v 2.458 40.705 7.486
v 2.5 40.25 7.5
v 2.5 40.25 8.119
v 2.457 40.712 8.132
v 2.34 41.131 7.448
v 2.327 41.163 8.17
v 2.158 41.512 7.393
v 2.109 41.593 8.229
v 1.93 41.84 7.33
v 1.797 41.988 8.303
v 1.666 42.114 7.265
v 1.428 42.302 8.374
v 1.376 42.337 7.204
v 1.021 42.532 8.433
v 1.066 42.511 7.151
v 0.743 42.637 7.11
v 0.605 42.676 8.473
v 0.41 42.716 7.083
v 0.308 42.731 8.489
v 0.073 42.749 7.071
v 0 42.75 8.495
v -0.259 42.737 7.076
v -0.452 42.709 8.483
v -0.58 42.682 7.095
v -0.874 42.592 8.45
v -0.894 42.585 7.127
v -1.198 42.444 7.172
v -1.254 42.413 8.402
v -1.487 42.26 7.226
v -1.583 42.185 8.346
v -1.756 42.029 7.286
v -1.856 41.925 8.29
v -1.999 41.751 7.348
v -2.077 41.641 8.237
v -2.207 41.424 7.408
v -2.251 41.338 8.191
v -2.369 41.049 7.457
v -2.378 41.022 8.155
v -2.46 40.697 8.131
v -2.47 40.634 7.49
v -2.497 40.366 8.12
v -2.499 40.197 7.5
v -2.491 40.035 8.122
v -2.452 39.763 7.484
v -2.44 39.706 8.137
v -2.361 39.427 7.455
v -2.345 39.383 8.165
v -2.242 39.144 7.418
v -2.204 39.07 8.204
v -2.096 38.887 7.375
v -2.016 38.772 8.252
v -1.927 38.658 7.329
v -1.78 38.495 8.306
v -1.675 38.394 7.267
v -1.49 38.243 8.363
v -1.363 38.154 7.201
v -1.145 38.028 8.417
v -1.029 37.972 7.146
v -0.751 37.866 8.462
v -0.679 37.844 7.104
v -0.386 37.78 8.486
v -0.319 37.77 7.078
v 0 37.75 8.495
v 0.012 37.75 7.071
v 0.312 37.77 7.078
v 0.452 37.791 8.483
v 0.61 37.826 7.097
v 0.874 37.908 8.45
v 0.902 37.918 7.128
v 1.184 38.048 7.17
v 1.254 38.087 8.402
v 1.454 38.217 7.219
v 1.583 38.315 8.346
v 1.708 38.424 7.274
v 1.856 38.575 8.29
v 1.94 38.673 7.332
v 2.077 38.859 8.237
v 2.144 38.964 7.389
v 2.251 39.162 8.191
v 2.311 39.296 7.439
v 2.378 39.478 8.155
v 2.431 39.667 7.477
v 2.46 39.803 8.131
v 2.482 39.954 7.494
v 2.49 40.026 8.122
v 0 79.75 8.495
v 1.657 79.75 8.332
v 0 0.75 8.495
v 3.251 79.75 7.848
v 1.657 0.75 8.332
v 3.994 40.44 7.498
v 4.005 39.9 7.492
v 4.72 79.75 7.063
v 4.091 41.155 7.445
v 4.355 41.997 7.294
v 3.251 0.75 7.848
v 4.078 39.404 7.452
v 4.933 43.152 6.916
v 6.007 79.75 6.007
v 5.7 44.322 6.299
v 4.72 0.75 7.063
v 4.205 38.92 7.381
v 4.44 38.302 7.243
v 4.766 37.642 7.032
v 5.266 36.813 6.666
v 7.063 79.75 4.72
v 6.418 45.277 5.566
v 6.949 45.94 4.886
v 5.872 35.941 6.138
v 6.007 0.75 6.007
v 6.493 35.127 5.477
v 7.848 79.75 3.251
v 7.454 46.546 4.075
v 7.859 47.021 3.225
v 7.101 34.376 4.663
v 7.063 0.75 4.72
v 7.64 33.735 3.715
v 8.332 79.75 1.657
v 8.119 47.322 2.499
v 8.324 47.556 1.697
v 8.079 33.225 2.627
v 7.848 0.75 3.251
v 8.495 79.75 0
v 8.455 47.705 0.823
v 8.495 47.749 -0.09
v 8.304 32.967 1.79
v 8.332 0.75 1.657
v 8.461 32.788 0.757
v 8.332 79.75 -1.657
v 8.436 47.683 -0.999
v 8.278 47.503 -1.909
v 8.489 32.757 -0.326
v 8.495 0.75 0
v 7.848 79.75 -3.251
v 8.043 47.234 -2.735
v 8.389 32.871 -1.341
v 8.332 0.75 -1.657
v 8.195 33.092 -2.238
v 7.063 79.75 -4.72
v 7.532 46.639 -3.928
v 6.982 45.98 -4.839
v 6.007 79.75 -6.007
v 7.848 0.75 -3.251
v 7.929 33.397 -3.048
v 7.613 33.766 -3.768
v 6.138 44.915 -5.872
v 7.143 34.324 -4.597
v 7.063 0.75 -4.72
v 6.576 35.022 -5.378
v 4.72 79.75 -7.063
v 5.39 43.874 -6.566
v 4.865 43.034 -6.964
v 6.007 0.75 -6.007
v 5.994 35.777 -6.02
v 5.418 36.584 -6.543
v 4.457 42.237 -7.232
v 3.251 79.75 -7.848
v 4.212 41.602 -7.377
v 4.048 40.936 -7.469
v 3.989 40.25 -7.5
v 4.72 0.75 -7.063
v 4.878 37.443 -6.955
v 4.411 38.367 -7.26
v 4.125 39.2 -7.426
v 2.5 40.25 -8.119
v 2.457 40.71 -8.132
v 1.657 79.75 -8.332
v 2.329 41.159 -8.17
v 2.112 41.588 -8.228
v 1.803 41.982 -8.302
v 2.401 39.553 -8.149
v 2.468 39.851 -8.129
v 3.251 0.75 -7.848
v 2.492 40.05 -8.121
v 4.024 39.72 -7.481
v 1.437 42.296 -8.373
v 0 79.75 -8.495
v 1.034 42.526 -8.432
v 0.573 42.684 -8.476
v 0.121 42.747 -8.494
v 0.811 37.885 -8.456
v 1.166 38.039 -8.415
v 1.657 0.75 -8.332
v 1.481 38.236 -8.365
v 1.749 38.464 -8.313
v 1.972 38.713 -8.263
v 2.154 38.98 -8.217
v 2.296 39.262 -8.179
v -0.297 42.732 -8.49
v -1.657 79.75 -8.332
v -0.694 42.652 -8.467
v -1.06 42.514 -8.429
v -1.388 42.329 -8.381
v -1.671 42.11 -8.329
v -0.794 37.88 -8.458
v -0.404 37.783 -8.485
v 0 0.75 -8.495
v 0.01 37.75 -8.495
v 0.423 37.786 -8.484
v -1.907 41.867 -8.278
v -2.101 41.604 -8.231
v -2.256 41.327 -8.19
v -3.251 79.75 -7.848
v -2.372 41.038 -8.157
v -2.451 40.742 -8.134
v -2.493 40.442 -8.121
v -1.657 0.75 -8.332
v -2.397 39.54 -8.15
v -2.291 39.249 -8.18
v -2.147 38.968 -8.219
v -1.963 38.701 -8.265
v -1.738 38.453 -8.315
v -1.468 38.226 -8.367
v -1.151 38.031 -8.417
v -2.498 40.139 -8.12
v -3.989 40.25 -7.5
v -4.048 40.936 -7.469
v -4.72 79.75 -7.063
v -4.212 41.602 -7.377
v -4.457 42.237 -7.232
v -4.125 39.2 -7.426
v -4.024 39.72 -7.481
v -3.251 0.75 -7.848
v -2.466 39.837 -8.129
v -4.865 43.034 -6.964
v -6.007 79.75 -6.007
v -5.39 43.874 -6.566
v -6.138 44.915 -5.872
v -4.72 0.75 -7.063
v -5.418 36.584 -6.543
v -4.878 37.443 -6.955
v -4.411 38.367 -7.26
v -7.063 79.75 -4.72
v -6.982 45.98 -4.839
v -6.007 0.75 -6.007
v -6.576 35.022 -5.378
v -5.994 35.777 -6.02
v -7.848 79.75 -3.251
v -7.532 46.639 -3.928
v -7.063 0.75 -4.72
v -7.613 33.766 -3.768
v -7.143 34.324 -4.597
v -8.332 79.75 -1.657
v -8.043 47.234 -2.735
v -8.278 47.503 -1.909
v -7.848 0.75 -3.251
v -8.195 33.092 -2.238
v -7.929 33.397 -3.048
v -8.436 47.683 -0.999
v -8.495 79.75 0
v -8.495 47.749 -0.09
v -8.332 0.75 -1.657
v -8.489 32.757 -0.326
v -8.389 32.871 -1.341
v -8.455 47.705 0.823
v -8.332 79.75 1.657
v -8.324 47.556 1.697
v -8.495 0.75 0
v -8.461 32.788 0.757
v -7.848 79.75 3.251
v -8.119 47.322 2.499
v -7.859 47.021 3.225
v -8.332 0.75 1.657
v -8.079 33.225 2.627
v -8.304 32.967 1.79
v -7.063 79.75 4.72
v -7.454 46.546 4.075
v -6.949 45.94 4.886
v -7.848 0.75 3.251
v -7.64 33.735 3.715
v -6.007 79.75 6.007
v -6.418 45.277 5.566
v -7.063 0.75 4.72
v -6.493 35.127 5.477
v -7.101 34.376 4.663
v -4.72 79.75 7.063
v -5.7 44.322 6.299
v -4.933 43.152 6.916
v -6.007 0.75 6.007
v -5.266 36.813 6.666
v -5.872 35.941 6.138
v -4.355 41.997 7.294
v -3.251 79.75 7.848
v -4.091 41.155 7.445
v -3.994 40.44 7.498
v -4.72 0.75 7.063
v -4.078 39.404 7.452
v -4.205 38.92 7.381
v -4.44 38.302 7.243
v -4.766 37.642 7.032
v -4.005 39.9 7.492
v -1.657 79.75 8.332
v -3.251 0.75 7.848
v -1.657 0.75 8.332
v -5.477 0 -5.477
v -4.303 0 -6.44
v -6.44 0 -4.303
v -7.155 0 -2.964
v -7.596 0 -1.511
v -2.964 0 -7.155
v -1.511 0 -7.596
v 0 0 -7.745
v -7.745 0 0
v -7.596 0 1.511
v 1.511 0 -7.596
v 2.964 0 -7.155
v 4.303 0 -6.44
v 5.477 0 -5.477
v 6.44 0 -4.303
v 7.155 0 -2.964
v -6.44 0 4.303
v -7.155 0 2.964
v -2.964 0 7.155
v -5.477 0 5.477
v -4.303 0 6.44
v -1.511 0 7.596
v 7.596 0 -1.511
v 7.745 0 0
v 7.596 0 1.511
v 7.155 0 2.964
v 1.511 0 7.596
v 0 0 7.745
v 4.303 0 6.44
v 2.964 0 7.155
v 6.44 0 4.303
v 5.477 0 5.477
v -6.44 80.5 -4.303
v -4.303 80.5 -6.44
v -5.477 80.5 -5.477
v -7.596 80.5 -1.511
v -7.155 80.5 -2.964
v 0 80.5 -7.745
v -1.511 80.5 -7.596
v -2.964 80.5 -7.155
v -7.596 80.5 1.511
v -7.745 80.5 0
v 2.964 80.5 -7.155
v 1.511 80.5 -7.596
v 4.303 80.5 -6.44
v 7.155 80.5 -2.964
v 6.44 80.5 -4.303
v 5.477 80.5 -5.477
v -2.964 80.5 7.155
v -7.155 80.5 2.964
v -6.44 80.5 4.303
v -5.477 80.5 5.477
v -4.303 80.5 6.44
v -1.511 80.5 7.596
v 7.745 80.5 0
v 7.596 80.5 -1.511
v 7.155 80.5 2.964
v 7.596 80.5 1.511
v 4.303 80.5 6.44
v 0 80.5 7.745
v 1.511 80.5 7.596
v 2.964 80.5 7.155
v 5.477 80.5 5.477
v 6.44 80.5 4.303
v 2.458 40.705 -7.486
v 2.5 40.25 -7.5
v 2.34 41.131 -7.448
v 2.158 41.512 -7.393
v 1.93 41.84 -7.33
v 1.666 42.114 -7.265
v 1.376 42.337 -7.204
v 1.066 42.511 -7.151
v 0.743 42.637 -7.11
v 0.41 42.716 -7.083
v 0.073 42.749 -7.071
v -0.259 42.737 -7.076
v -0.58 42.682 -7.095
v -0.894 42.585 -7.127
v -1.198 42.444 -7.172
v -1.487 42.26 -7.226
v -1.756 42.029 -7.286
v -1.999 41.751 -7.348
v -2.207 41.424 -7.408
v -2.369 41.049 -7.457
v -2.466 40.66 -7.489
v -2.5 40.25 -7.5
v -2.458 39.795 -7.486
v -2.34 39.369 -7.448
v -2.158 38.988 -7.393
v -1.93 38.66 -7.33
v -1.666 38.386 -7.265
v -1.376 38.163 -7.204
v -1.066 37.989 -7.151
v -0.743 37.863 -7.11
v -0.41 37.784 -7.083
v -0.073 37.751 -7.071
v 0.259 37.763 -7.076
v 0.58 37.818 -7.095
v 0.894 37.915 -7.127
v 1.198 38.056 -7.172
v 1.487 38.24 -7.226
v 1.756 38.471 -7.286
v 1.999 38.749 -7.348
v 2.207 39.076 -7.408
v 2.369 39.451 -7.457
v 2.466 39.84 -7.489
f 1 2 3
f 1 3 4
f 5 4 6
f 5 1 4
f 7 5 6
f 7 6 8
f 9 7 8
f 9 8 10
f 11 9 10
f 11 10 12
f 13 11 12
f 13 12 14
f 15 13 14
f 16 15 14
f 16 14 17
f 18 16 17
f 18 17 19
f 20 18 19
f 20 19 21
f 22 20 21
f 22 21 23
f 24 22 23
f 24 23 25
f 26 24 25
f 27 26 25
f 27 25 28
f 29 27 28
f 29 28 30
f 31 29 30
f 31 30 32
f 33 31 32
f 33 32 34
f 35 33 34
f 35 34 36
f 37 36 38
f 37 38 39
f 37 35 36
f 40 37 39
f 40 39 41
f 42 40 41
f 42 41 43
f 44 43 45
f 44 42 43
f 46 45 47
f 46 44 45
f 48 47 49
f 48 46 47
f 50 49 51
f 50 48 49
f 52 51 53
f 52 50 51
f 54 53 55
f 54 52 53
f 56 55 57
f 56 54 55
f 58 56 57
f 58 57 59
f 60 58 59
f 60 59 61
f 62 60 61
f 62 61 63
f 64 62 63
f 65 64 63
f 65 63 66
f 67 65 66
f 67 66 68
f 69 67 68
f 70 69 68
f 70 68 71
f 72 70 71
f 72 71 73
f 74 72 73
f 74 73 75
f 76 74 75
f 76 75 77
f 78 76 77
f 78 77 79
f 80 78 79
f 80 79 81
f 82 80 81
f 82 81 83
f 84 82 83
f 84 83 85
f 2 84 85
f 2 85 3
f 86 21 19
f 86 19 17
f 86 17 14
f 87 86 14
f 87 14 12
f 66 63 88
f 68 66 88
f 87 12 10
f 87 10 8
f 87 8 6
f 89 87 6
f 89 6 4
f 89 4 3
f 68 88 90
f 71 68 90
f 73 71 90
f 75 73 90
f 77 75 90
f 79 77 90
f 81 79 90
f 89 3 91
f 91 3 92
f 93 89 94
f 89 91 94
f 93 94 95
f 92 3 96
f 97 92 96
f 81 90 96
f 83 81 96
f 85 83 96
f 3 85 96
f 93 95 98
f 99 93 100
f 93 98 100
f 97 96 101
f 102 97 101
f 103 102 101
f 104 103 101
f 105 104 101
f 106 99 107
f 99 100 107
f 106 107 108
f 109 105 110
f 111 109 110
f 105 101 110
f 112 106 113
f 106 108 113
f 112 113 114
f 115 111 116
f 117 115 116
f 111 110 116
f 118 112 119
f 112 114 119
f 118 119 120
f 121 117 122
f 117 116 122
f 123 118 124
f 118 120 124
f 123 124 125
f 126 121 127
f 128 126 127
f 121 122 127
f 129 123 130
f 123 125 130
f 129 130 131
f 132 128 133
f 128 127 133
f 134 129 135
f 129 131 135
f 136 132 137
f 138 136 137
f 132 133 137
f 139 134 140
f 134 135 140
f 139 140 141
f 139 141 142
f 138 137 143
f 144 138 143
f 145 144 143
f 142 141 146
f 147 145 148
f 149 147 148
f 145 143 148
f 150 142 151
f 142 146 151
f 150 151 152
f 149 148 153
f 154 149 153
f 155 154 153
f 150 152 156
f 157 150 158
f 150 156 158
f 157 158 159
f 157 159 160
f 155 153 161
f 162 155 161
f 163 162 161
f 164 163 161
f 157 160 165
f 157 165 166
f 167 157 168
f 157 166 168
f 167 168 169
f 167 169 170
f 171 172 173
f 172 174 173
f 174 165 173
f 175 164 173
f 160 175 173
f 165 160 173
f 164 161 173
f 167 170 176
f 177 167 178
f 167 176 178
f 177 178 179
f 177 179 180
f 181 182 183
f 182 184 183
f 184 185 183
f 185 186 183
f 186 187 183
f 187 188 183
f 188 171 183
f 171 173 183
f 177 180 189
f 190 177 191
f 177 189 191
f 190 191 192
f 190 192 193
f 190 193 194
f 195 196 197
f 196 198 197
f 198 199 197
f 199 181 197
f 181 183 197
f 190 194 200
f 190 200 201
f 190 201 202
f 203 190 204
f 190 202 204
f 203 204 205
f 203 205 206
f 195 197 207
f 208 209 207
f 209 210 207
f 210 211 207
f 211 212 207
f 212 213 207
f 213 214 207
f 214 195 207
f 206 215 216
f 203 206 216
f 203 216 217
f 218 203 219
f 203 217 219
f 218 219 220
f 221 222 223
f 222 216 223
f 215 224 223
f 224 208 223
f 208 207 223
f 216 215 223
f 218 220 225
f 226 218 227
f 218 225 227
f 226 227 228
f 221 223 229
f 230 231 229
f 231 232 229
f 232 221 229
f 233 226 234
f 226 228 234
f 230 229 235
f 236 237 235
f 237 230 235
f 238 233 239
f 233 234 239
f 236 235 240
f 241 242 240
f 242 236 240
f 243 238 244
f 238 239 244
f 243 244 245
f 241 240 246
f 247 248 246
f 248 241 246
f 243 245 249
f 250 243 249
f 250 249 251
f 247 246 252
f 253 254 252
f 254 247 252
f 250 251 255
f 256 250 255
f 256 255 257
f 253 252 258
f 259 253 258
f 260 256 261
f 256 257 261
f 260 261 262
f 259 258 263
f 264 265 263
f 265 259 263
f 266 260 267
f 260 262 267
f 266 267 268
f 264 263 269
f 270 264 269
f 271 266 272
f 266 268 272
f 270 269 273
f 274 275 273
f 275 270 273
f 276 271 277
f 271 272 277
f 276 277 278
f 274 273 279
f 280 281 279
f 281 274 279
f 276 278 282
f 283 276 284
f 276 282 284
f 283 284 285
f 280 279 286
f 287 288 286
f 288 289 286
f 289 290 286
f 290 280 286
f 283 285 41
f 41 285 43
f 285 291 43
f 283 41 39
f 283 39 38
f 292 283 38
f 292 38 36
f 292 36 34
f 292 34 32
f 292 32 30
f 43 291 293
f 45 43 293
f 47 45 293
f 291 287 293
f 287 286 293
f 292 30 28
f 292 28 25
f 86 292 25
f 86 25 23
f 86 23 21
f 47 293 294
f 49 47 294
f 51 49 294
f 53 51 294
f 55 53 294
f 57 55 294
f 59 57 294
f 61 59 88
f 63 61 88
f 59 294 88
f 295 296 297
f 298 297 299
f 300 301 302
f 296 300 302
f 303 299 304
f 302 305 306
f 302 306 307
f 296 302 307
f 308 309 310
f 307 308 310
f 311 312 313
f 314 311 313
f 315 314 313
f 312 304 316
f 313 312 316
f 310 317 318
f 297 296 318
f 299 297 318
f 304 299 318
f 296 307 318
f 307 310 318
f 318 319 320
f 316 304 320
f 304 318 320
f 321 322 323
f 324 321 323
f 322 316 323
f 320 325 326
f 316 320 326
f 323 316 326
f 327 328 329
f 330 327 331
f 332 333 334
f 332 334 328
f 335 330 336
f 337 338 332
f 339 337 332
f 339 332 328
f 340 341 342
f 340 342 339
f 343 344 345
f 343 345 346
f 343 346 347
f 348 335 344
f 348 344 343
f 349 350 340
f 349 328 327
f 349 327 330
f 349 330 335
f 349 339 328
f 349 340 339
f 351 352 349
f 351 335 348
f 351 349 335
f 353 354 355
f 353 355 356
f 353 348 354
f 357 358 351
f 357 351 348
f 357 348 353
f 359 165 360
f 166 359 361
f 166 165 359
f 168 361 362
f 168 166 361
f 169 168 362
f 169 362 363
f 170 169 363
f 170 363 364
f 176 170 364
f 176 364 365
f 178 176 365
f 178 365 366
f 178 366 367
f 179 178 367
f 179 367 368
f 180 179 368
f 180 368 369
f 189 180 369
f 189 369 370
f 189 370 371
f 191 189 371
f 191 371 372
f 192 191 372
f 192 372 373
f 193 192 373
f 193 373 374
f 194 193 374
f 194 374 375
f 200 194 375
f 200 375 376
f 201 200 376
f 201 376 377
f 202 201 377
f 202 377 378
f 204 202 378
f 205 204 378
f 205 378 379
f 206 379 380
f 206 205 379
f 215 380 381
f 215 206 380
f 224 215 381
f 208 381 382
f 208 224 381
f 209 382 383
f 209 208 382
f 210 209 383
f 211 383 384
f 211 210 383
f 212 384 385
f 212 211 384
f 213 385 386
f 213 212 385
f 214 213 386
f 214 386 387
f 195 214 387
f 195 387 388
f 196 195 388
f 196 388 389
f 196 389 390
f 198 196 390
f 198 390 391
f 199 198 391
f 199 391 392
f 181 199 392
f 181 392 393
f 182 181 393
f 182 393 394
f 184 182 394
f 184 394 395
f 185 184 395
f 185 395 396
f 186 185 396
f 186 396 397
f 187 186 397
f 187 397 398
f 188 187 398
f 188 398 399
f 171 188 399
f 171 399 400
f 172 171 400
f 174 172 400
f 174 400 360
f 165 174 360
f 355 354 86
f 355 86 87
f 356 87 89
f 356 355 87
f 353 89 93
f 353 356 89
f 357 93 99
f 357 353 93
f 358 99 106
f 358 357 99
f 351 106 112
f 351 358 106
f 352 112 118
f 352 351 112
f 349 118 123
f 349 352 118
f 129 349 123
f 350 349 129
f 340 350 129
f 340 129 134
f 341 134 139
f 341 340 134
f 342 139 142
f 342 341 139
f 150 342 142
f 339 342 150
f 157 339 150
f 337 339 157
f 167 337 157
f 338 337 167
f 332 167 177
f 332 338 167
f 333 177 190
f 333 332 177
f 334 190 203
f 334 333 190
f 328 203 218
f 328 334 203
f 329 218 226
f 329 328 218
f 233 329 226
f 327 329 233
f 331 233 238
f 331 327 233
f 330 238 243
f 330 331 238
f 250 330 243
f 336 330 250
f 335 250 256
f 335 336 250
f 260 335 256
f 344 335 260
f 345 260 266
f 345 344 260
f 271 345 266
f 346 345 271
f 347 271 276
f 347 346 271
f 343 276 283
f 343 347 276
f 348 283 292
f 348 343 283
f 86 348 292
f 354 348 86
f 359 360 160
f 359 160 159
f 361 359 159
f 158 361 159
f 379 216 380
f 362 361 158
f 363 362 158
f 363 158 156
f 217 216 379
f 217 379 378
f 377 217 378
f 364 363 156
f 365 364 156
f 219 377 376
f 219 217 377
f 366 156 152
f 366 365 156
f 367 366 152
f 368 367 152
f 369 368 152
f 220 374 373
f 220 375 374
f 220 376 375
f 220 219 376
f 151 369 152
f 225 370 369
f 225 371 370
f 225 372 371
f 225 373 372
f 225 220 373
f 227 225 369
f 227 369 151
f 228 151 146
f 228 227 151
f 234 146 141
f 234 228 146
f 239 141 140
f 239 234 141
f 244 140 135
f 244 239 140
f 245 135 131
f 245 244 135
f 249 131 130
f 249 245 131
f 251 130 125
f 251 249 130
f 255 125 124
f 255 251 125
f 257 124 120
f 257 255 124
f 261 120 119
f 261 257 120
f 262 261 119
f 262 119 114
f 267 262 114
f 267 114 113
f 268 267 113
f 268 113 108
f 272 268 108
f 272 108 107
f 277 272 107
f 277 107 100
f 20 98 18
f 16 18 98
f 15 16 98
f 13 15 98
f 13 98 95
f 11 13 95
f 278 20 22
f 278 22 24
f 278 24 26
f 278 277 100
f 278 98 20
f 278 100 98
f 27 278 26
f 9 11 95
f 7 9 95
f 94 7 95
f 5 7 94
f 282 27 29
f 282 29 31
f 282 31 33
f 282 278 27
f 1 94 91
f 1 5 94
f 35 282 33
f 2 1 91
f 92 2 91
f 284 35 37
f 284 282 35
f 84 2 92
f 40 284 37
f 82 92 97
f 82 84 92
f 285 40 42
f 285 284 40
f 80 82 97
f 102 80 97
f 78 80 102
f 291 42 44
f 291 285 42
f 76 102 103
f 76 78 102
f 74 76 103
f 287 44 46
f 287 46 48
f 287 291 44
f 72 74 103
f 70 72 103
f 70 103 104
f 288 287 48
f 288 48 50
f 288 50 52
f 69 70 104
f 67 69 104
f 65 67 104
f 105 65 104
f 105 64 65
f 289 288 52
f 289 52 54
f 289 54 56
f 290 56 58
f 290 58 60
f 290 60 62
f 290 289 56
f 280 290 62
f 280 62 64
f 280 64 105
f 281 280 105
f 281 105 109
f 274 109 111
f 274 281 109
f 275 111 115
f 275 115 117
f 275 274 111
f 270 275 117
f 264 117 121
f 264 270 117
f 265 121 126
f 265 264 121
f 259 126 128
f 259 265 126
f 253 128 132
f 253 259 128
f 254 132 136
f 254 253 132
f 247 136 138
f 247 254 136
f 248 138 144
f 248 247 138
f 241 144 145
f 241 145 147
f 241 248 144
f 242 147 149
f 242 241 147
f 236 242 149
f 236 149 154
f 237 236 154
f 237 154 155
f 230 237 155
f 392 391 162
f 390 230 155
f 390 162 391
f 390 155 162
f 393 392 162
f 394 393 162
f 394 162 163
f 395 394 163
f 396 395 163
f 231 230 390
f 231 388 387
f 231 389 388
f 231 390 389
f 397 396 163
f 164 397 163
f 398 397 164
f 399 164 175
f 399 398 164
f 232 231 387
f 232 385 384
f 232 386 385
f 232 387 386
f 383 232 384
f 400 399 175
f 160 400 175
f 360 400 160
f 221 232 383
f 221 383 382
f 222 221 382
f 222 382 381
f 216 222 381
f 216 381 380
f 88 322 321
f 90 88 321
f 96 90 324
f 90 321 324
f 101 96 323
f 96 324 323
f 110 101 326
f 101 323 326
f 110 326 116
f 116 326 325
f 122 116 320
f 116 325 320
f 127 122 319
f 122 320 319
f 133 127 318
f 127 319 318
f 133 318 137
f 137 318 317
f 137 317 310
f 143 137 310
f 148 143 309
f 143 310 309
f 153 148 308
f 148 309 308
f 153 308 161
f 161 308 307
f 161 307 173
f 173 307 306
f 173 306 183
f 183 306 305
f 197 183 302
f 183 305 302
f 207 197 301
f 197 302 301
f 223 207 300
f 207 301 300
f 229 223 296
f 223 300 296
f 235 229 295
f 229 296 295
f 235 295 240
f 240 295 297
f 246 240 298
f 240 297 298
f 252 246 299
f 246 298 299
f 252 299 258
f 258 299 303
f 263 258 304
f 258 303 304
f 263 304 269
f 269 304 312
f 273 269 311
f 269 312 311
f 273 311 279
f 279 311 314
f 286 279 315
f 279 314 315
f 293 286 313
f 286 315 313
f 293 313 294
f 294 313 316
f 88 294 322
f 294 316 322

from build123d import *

# Parameters (mm, degrees)
SKETCH1_R               = 8.495
BOSS_EXTRUDE1_DEPTH     = 80.5
CHAMFER1_SIZE           = 0.75
CUT_EXTRUDE1_DEPTH      = 82.391523207
CUT_EXTRUDE1_DEPTH_BACK = 82.391523207
SKETCH2_R               = 7.5
CUT_EXTRUDE2_DEPTH      = 82.391523228
CUT_EXTRUDE2_DEPTH_BACK = 82.391523228
SKETCH3_R               = 2.5


with BuildPart() as part:
    # Sketch1 → Boss-Extrude1 (new body)
    with BuildSketch(Plane(origin=(0, 0, 0), x_dir=(1, 0, 0), z_dir=(0, 1, 0))):
        with Locations(Location((0, 0, 0), (0, 0, 270))):
            Circle(SKETCH1_R)
    extrude(amount=BOSS_EXTRUDE1_DEPTH)

    # Chamfer1
    chamfer1_edges = [part.edges().sort_by_distance(p)[0] for p in [
        (0, 0, -8.495),
        (0, 80.5, -8.495),
    ]]
    chamfer(chamfer1_edges, length=CHAMFER1_SIZE)

    # Sketch2 → Cut-Extrude1 (cut, two sides: drawn at the far end of the back side and taken through both)
    with BuildSketch(Plane(origin=(0, 0, 0), x_dir=(0, 0, -1), z_dir=(1, 0, 0)).offset(-CUT_EXTRUDE1_DEPTH_BACK)):
        with Locations((0, 40.25)):
            Circle(SKETCH2_R)
    extrude(amount=CUT_EXTRUDE1_DEPTH + CUT_EXTRUDE1_DEPTH_BACK, mode=Mode.SUBTRACT)

    # Sketch3 → Cut-Extrude2 (cut, two sides: drawn at the far end of the back side and taken through both)
    with BuildSketch(Plane.XY.offset(-CUT_EXTRUDE2_DEPTH_BACK)):
        with Locations((0, 40.25)):
            Circle(SKETCH3_R)
    extrude(amount=CUT_EXTRUDE2_DEPTH + CUT_EXTRUDE2_DEPTH_BACK, mode=Mode.SUBTRACT)


solid = part.part
